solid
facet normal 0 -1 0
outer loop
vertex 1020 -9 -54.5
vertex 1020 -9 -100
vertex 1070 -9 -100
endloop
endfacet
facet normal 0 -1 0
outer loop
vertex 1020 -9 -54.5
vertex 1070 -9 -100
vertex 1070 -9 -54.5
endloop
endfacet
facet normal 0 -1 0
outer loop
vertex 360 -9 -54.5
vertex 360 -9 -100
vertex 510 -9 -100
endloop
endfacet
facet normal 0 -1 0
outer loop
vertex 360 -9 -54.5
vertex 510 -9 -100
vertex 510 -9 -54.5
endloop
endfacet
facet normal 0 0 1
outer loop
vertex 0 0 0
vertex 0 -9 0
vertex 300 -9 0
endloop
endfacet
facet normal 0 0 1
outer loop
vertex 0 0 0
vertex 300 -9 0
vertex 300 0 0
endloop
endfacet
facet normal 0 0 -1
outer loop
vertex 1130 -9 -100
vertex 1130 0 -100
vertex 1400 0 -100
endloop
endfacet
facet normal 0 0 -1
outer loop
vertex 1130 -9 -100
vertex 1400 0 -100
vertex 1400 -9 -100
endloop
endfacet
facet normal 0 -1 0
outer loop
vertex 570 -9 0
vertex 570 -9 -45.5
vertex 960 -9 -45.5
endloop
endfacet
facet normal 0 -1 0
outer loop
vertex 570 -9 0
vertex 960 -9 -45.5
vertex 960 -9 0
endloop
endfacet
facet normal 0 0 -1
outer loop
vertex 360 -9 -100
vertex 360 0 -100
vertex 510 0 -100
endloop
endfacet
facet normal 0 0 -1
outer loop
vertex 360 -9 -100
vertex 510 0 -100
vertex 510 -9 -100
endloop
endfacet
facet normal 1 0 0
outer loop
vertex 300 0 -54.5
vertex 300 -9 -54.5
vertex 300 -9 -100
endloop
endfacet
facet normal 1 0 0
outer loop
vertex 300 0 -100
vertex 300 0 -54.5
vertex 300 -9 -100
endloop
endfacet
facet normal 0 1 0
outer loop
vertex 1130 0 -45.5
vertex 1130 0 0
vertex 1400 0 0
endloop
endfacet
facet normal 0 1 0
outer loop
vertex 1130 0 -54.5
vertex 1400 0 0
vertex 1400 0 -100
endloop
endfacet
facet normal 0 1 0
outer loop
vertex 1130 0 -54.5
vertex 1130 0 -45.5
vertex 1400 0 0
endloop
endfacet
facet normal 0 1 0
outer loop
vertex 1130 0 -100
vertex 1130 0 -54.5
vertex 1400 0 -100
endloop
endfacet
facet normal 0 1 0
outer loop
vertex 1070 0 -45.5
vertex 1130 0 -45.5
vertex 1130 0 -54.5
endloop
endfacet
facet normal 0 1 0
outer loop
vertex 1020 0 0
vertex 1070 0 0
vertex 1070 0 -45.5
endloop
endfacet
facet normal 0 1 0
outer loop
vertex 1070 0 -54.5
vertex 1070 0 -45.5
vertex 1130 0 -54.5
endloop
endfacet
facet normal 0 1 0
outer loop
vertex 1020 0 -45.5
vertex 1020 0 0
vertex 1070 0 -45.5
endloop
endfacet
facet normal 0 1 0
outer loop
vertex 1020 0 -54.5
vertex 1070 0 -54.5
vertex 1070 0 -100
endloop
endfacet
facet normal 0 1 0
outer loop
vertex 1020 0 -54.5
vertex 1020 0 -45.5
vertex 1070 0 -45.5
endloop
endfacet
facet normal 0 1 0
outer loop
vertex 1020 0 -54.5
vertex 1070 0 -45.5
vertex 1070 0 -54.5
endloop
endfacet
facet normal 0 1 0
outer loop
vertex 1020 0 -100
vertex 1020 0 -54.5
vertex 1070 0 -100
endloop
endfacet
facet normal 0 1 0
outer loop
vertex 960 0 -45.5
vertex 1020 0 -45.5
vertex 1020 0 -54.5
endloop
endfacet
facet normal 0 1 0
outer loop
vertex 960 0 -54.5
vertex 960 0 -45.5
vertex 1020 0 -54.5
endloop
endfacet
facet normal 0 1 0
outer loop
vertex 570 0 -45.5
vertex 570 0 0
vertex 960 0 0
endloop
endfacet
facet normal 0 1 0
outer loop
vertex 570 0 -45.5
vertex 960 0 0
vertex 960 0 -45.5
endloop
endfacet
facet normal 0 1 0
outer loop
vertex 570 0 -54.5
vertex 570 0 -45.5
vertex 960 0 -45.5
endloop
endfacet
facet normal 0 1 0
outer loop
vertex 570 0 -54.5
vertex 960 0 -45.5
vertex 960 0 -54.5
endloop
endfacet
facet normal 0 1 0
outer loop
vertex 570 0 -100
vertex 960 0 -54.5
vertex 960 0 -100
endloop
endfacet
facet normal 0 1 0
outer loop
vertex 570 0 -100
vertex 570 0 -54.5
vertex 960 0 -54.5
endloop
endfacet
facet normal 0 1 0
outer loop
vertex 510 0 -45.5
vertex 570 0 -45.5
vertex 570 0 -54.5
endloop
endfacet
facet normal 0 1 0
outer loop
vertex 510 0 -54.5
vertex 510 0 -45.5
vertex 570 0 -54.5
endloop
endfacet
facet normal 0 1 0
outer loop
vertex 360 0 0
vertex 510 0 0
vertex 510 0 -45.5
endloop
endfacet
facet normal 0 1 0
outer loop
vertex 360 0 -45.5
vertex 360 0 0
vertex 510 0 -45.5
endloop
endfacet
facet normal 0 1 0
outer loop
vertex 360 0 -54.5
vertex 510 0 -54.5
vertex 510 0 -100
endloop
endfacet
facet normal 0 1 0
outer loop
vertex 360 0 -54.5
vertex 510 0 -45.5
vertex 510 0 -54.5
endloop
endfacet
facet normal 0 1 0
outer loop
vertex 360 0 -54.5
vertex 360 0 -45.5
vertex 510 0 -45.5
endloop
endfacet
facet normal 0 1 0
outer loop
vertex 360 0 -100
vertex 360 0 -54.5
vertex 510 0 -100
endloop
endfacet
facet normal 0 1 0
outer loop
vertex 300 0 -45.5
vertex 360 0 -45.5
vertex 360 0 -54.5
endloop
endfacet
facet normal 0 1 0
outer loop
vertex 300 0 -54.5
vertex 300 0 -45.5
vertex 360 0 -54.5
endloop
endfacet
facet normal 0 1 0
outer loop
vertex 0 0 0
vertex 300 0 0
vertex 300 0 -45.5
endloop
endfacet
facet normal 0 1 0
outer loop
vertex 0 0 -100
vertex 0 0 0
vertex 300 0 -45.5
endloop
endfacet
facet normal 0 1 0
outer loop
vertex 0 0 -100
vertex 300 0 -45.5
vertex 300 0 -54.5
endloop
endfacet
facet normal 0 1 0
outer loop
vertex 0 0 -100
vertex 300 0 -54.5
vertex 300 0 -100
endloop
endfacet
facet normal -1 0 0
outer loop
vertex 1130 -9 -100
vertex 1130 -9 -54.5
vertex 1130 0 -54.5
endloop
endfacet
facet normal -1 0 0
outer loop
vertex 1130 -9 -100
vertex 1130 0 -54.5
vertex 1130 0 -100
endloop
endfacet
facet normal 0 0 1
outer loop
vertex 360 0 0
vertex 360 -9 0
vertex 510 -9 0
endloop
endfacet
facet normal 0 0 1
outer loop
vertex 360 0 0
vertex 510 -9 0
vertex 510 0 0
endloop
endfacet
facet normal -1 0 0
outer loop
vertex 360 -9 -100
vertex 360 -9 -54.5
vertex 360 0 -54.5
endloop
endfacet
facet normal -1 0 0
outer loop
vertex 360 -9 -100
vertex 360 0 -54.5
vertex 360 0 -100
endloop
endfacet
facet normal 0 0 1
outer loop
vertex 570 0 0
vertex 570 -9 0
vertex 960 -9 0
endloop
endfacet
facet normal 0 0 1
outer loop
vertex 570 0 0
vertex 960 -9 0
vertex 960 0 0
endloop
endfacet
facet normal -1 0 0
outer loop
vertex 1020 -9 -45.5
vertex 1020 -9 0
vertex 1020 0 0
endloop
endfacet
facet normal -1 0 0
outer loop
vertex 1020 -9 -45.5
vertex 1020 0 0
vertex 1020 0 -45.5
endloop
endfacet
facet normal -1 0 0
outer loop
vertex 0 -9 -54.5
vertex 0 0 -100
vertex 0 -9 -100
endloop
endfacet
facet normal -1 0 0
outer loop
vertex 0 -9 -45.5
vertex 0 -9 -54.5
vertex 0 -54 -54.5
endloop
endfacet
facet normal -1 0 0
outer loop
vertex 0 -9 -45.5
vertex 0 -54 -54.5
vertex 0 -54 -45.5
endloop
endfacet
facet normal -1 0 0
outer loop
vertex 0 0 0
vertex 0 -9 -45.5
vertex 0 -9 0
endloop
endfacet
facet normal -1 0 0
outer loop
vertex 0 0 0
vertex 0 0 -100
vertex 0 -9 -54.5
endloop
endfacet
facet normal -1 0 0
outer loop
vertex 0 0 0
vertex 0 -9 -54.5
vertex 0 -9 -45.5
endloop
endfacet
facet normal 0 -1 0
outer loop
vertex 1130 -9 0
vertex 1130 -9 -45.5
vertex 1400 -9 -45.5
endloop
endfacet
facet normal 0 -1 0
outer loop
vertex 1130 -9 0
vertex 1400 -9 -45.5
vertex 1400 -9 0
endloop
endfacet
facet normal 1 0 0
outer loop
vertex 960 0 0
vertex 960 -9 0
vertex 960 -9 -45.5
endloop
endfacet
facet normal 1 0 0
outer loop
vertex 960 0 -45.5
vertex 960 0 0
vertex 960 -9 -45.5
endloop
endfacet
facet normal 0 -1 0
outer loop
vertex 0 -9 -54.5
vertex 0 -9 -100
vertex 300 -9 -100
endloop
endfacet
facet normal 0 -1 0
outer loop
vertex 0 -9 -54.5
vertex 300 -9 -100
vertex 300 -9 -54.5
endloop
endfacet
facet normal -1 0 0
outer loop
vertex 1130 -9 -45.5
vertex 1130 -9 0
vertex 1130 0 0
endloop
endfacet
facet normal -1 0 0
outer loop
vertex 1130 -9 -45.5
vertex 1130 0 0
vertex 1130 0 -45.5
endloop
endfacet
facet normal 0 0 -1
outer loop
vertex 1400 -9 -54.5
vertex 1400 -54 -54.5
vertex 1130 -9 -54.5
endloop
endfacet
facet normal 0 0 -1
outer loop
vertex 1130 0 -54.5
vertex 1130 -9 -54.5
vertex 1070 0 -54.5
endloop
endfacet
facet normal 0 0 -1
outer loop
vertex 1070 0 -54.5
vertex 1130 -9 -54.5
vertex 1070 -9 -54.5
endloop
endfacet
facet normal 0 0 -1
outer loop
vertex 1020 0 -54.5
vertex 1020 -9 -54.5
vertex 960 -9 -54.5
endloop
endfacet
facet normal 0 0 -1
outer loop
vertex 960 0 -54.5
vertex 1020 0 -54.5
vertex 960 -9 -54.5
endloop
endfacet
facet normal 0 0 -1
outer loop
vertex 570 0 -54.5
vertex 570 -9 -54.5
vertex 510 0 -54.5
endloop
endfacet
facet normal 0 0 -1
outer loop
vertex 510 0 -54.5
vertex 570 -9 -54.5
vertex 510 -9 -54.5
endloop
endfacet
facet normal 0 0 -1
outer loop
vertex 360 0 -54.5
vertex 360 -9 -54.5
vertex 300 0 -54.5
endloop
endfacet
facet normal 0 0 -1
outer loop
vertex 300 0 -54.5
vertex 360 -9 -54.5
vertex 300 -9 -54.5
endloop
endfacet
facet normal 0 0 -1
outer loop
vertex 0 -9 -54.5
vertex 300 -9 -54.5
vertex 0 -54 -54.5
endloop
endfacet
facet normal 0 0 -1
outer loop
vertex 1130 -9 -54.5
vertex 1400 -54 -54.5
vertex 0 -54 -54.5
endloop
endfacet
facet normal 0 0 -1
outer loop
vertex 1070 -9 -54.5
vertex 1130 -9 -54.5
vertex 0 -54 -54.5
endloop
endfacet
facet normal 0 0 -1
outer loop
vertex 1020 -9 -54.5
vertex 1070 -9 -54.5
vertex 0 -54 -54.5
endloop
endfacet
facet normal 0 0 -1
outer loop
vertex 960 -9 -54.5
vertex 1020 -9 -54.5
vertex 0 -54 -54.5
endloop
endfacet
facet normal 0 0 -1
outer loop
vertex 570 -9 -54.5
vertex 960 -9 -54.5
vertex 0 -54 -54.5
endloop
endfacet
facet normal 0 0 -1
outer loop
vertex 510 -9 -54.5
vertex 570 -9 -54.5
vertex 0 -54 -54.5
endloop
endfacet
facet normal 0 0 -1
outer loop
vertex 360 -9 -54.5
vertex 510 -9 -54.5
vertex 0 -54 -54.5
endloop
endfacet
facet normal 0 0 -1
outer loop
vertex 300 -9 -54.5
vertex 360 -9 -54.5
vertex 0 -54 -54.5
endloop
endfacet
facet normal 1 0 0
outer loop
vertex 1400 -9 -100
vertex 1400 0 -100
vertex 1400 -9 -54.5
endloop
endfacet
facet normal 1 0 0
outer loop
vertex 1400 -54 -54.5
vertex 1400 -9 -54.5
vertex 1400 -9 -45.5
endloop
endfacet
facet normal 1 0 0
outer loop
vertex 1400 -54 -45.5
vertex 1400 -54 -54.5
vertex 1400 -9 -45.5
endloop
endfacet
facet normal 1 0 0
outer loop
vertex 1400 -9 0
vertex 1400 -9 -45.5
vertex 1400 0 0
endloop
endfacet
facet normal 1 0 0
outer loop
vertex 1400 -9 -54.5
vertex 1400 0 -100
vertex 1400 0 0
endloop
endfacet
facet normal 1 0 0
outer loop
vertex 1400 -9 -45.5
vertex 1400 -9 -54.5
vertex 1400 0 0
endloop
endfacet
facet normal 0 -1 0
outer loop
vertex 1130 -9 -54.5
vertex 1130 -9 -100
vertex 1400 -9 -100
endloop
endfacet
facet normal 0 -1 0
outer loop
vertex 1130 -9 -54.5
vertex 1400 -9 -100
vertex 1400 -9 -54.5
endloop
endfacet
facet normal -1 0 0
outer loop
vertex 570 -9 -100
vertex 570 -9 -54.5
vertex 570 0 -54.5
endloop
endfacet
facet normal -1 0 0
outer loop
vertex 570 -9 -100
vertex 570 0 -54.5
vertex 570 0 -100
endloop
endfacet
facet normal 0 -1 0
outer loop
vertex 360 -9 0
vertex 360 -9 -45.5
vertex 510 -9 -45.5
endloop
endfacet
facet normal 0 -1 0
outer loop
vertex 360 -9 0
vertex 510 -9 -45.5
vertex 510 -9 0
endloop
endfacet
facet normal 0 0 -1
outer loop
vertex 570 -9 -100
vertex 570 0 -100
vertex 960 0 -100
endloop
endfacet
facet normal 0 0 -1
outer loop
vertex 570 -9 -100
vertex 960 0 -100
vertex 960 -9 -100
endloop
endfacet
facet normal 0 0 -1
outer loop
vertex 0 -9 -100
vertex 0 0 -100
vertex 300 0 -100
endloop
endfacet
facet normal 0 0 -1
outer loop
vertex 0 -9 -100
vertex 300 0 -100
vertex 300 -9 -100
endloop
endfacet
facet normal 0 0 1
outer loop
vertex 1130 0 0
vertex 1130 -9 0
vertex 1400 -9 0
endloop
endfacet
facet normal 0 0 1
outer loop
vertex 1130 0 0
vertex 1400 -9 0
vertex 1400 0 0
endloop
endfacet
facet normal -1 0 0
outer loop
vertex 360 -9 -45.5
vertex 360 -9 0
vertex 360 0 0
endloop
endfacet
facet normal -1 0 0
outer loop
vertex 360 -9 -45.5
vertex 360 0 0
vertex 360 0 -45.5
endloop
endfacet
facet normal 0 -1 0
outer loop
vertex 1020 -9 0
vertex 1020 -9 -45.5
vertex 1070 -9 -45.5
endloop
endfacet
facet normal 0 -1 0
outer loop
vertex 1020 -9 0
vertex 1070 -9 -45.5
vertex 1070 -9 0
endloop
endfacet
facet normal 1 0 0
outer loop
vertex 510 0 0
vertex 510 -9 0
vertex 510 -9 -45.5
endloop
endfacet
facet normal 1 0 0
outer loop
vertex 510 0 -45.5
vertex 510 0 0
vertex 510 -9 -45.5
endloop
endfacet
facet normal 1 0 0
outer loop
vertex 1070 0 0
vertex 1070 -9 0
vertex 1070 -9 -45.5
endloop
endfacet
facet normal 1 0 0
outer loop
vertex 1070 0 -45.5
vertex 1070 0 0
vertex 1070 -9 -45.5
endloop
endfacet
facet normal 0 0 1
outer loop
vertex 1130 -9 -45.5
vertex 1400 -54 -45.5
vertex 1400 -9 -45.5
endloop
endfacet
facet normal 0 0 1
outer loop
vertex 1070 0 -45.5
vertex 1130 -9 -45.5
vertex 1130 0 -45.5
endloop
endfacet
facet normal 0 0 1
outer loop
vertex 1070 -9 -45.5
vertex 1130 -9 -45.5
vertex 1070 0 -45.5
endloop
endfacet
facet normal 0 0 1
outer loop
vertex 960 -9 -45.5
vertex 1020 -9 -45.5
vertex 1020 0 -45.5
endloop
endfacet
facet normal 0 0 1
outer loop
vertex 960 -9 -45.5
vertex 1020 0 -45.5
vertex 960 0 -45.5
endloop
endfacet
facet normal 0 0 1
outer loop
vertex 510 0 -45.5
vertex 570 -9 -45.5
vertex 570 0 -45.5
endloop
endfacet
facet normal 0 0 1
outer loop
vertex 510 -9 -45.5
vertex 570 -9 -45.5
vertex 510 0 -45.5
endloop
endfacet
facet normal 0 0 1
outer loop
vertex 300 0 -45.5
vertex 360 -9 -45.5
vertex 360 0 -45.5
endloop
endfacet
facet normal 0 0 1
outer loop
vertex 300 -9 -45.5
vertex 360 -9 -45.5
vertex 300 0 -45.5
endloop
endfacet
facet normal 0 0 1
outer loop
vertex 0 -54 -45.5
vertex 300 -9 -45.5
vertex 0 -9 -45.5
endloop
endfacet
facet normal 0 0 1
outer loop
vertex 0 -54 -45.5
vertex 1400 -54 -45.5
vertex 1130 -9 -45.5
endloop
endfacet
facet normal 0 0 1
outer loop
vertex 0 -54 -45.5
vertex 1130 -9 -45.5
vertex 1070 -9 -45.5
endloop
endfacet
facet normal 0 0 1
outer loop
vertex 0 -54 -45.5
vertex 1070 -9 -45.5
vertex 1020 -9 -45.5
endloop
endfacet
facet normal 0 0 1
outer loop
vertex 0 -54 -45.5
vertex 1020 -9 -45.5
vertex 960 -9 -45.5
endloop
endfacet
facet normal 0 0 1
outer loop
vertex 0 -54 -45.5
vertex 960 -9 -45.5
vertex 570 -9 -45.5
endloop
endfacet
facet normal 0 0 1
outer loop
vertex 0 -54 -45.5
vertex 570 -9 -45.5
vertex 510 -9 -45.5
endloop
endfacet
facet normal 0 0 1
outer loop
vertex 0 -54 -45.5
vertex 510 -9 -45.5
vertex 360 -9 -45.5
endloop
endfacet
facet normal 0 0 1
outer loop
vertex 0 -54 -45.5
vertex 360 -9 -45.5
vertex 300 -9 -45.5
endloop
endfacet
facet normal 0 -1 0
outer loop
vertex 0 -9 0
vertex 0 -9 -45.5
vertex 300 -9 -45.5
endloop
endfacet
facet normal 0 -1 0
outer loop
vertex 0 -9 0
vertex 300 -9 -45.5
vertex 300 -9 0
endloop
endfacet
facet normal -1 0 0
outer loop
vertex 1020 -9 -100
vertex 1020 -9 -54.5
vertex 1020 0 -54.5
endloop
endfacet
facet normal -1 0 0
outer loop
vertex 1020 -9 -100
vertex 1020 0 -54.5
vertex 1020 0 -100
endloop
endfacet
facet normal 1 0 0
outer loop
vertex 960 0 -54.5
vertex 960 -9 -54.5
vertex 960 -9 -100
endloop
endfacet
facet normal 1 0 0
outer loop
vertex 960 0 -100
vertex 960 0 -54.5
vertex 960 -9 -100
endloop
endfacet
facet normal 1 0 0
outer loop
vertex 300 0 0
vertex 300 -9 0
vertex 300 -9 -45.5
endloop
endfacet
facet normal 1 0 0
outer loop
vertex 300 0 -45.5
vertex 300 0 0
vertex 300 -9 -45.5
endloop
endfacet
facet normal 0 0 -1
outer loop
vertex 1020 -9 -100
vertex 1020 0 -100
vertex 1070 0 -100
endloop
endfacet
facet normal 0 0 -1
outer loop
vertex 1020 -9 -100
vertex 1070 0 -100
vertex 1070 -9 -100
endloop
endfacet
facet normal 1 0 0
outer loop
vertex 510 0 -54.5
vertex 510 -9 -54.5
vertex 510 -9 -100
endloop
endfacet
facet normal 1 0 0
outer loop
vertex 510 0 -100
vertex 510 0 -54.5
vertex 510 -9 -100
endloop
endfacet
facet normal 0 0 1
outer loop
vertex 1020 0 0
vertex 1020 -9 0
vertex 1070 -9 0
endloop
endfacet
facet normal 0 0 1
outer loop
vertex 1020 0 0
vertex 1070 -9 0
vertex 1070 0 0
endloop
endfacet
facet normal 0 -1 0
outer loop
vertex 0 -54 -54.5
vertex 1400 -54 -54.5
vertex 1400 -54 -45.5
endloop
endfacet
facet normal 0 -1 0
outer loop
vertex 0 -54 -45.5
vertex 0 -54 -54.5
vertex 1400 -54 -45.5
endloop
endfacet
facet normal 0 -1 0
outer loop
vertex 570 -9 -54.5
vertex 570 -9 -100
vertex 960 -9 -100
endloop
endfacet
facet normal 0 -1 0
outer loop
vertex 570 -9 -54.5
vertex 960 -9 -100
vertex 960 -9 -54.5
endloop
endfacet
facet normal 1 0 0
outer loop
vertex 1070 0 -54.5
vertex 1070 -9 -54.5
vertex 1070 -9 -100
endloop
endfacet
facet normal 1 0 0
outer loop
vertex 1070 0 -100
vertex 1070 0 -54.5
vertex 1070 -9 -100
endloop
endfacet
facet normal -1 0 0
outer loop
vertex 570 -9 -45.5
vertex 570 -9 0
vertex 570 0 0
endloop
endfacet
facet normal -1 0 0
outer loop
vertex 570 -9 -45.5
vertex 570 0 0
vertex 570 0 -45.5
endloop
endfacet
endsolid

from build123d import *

# Parameters (mm, degrees)
BOSS_EXTRUDE1_DEPTH = 1400
SKETCH1_W           = 60
SKETCH1_H           = 45.5
CUT_EXTRUDE1_DEPTH  = 1405.288075859


with BuildPart() as part:
    # Sketch T → Boss-Extrude1 (new body)
    with BuildSketch(Plane(origin=(0, 0, 0), x_dir=(0, 0, -1), z_dir=(1, 0, 0))):
        Polygon((0, 0), (100, 0), (100, -9), (54.5, -9), (54.5, -54), (45.5, -54), (45.5, -9), (0, -9), align=None)
    extrude(amount=BOSS_EXTRUDE1_DEPTH)

    # Sketch1 → Cut-Extrude1 (cut, through all)
    with BuildSketch(Plane(origin=(0, -9, 0), x_dir=(-1, 0, 0), z_dir=(0, -1, 0))):
        with Locations((-330, 22.75)):
            Rectangle(SKETCH1_W, SKETCH1_H)
        with Locations((-540, 22.75)):
            Rectangle(SKETCH1_W, SKETCH1_H)
        with Locations((-1100, 22.75)):
            Rectangle(SKETCH1_W, SKETCH1_H)
        with Locations((-1100, 77.25)):
            Rectangle(SKETCH1_W, SKETCH1_H)
        with Locations((-540, 77.25)):
            Rectangle(SKETCH1_W, SKETCH1_H)
        with Locations((-330, 77.25)):
            Rectangle(SKETCH1_W, SKETCH1_H)
        with Locations((-990, 22.75)):
            Rectangle(SKETCH1_W, SKETCH1_H)
        with Locations((-990, 77.25)):
            Rectangle(SKETCH1_W, SKETCH1_H)
    extrude(amount=-CUT_EXTRUDE1_DEPTH, mode=Mode.SUBTRACT)


solid = part.part
